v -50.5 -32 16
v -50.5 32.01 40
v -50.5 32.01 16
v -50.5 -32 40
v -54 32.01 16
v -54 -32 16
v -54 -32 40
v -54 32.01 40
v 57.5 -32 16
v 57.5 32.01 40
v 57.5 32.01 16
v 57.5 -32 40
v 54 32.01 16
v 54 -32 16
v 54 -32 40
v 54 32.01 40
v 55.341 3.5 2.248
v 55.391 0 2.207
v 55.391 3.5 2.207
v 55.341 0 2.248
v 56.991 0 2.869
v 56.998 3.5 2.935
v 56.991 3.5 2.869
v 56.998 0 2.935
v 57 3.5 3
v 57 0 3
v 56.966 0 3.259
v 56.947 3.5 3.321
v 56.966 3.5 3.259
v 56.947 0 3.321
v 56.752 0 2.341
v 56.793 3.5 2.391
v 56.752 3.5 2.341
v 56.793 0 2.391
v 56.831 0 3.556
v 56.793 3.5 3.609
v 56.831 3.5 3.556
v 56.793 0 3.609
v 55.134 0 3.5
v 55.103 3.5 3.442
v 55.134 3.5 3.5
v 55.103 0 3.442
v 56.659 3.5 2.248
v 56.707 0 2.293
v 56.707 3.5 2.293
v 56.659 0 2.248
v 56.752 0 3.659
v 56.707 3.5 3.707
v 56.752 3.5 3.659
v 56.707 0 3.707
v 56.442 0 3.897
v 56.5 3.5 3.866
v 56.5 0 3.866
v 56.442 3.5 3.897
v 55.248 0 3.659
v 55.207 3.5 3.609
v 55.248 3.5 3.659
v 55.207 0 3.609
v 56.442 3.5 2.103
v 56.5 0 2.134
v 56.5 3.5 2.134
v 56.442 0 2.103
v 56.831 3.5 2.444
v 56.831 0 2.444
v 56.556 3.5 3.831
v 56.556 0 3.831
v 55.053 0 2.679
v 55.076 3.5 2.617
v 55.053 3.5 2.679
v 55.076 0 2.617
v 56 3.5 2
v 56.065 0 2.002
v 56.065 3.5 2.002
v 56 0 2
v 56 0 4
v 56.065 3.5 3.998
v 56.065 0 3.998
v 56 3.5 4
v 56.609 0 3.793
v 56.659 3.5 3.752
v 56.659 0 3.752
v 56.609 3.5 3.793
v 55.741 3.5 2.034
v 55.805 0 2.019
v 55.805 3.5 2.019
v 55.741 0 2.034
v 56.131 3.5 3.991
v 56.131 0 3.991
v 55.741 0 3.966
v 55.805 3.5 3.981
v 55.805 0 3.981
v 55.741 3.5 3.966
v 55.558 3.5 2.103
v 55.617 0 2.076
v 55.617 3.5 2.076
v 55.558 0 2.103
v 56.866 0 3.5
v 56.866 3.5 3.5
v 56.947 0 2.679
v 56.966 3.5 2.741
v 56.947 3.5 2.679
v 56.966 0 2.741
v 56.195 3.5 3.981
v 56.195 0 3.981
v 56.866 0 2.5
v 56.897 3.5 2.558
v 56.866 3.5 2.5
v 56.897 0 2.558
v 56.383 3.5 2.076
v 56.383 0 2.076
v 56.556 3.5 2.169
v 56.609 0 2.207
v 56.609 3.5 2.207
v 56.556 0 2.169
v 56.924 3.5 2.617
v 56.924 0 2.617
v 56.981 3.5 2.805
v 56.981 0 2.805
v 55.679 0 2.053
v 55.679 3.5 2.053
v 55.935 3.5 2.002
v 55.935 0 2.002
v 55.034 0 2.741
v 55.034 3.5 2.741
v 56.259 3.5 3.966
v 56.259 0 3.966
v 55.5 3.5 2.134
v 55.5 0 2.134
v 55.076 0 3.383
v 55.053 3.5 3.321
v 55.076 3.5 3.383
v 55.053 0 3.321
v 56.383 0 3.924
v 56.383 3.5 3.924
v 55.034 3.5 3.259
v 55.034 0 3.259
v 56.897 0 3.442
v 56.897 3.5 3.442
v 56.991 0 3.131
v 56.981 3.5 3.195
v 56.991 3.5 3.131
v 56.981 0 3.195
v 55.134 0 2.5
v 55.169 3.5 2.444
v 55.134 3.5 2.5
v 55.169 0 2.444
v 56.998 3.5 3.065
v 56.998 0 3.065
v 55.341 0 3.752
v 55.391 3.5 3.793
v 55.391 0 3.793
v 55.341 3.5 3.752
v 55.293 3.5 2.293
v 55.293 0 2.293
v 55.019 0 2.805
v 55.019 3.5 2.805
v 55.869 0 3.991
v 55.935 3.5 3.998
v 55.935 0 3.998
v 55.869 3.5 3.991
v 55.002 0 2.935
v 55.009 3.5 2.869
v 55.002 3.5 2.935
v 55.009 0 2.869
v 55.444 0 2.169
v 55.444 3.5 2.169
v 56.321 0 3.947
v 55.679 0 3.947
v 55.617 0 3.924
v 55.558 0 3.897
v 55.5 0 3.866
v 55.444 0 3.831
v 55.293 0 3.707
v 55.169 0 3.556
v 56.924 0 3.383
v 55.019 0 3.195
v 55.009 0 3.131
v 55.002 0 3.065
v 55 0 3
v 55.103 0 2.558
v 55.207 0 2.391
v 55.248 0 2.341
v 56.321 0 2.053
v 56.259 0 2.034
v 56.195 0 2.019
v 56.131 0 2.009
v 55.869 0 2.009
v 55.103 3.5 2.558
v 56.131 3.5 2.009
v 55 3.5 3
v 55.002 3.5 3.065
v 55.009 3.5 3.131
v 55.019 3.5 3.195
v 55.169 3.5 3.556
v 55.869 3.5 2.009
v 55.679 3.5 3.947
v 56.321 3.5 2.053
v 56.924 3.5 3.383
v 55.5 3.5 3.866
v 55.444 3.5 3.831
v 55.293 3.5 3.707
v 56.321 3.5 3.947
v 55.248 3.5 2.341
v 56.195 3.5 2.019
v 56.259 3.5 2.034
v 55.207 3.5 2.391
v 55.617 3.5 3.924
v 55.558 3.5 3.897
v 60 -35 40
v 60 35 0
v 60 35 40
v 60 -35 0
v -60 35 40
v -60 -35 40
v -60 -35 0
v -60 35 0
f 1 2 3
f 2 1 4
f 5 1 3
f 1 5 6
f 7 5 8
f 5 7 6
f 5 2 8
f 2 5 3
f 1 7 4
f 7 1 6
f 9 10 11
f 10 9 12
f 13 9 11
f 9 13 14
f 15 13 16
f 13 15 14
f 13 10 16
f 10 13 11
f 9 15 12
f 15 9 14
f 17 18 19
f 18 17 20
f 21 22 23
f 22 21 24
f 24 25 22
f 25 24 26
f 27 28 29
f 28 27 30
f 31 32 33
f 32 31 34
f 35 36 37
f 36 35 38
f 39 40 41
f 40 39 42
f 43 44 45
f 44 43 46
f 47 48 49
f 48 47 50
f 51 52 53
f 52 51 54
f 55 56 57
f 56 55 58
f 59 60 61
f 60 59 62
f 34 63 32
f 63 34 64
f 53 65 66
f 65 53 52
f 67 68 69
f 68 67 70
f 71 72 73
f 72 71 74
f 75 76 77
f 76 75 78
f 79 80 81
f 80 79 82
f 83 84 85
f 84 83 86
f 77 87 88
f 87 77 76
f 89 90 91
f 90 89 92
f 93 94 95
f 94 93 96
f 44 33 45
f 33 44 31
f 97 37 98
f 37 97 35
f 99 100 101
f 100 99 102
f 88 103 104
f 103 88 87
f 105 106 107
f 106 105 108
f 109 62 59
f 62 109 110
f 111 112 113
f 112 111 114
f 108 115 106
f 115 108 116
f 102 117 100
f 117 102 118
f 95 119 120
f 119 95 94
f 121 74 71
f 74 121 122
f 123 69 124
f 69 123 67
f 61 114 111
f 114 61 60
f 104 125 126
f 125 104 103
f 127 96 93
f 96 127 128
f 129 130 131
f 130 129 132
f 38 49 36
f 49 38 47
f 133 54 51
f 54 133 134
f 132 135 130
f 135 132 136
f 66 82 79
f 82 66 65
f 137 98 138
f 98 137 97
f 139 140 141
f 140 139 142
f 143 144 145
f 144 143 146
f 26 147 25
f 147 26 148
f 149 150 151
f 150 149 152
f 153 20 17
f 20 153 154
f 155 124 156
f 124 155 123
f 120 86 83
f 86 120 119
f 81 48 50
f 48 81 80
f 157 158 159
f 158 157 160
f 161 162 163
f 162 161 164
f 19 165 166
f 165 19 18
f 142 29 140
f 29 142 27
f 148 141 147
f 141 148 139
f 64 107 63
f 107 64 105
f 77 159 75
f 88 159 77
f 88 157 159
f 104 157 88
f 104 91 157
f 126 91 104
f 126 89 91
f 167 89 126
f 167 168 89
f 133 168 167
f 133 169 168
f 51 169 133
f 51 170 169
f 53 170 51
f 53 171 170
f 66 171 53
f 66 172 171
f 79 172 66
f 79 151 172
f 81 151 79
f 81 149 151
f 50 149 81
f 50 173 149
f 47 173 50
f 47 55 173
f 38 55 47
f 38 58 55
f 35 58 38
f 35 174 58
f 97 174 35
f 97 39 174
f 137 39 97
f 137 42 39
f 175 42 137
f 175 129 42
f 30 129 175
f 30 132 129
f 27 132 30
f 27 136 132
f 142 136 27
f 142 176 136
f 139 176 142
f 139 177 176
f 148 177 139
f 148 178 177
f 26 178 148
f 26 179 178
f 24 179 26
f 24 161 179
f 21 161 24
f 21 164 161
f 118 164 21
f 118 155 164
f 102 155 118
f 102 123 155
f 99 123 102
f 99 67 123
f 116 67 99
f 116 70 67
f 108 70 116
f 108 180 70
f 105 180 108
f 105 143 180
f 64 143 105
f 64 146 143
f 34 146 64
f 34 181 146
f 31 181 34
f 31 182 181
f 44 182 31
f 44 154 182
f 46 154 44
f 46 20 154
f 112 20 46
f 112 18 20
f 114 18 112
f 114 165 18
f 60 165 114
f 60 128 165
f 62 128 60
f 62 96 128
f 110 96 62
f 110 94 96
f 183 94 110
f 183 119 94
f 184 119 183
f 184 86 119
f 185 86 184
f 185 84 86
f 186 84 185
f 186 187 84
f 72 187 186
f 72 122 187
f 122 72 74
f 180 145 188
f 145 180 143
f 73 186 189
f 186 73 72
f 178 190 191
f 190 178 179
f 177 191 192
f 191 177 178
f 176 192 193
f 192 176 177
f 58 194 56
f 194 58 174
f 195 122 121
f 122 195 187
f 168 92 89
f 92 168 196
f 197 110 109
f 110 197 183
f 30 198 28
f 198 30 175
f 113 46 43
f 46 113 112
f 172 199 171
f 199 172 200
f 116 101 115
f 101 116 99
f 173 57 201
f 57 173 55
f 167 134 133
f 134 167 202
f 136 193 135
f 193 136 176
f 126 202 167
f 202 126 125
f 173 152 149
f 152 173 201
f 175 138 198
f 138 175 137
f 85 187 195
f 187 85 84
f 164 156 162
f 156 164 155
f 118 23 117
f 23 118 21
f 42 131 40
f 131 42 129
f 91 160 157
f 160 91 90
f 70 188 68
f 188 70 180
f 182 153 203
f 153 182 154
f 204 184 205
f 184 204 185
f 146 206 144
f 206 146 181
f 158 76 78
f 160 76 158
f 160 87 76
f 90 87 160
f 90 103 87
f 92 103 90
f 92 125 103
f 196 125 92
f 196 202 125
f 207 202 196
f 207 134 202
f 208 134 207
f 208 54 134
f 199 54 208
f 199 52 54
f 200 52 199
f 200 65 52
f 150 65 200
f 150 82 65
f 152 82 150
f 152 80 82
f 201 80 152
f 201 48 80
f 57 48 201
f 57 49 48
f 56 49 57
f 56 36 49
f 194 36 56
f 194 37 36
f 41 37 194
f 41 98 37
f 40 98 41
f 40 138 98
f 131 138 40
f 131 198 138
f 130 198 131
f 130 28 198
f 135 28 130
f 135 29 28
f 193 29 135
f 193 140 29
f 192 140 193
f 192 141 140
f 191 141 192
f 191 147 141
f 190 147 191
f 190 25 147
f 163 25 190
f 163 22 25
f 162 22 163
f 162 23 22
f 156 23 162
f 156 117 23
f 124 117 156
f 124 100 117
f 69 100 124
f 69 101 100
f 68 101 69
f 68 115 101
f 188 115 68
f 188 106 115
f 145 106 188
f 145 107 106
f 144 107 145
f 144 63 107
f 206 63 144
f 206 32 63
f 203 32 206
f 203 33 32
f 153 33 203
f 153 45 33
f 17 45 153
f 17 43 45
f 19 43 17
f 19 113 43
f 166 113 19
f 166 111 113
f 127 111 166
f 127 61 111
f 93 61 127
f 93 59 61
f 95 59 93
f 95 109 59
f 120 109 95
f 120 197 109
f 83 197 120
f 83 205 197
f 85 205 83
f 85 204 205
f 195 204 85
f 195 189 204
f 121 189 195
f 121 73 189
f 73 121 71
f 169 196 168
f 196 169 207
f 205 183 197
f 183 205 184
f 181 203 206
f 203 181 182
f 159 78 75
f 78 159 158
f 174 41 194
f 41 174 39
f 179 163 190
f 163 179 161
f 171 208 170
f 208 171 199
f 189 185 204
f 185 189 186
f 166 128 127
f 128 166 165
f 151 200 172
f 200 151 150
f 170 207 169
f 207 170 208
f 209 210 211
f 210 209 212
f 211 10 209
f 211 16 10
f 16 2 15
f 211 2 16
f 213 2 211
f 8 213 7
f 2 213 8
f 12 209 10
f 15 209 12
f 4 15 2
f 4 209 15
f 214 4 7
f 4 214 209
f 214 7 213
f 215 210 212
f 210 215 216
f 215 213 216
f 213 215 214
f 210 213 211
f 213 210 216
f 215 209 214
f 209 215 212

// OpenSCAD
// Buffer tank for mini horizontal gel-electrophoresis box
// Units: mm. Tank rests on XY plane (z = 0), builds upward.

$fn = 96;

// ---- Tank ----
tank_x      = 120;   // outer length (X)
tank_y      = 70;    // outer width (Y)
tank_h      = 40;    // outer height (Z)
wall        = 3;     // wall thickness
floor_t     = 3;     // floor thickness

// ---- Gel-tray platform ----
plat_x      = 60;    // platform length in X (centred)
plat_top_z  = 13;    // platform top height above inner floor (z = 13)

// ---- Electrode holes ----
hole_d      = 2;     // electrode hole diameter
hole_y      = 0;     // electrode hole Y position
hole_w_z    = tank_h - floor_t; // hole length along Z (through wall)

// ---- Misc ----
eps         = 0.5;   // cutter overshoot past faces

// ---- Derived ----
inner_x = tank_x - 2 * wall;          // 114
inner_y = tank_y - 2 * wall;          // 64
inner_f_top = floor_t + plat_top_z;   // 16 (inner floor level to platform top)

difference() {
    // Main tank body
    translate([-tank_x/2, -tank_y/2, 0])
        cube([tank_x, tank_y, tank_h]);

    // Two end blocks that form the walls above the inner floor,
    // leaving the buffer chambers open until the platform top.
    for (sx = [-1, 1])
        translate([sx * (inner_x/2 - wall), -inner_y/2, inner_f_top])
            cube([wall + eps, inner_y + 0.01, tank_h - floor_t]);

    // Horizontal electrode holes through each end wall (along X)
    for (z = [floor_t, tank_h - wall])
        translate([inner_x/2 - 1, hole_y, z])
            rotate([-90, 0, 0])
                cylinder(d = hole_d, h = wall + eps);
}
